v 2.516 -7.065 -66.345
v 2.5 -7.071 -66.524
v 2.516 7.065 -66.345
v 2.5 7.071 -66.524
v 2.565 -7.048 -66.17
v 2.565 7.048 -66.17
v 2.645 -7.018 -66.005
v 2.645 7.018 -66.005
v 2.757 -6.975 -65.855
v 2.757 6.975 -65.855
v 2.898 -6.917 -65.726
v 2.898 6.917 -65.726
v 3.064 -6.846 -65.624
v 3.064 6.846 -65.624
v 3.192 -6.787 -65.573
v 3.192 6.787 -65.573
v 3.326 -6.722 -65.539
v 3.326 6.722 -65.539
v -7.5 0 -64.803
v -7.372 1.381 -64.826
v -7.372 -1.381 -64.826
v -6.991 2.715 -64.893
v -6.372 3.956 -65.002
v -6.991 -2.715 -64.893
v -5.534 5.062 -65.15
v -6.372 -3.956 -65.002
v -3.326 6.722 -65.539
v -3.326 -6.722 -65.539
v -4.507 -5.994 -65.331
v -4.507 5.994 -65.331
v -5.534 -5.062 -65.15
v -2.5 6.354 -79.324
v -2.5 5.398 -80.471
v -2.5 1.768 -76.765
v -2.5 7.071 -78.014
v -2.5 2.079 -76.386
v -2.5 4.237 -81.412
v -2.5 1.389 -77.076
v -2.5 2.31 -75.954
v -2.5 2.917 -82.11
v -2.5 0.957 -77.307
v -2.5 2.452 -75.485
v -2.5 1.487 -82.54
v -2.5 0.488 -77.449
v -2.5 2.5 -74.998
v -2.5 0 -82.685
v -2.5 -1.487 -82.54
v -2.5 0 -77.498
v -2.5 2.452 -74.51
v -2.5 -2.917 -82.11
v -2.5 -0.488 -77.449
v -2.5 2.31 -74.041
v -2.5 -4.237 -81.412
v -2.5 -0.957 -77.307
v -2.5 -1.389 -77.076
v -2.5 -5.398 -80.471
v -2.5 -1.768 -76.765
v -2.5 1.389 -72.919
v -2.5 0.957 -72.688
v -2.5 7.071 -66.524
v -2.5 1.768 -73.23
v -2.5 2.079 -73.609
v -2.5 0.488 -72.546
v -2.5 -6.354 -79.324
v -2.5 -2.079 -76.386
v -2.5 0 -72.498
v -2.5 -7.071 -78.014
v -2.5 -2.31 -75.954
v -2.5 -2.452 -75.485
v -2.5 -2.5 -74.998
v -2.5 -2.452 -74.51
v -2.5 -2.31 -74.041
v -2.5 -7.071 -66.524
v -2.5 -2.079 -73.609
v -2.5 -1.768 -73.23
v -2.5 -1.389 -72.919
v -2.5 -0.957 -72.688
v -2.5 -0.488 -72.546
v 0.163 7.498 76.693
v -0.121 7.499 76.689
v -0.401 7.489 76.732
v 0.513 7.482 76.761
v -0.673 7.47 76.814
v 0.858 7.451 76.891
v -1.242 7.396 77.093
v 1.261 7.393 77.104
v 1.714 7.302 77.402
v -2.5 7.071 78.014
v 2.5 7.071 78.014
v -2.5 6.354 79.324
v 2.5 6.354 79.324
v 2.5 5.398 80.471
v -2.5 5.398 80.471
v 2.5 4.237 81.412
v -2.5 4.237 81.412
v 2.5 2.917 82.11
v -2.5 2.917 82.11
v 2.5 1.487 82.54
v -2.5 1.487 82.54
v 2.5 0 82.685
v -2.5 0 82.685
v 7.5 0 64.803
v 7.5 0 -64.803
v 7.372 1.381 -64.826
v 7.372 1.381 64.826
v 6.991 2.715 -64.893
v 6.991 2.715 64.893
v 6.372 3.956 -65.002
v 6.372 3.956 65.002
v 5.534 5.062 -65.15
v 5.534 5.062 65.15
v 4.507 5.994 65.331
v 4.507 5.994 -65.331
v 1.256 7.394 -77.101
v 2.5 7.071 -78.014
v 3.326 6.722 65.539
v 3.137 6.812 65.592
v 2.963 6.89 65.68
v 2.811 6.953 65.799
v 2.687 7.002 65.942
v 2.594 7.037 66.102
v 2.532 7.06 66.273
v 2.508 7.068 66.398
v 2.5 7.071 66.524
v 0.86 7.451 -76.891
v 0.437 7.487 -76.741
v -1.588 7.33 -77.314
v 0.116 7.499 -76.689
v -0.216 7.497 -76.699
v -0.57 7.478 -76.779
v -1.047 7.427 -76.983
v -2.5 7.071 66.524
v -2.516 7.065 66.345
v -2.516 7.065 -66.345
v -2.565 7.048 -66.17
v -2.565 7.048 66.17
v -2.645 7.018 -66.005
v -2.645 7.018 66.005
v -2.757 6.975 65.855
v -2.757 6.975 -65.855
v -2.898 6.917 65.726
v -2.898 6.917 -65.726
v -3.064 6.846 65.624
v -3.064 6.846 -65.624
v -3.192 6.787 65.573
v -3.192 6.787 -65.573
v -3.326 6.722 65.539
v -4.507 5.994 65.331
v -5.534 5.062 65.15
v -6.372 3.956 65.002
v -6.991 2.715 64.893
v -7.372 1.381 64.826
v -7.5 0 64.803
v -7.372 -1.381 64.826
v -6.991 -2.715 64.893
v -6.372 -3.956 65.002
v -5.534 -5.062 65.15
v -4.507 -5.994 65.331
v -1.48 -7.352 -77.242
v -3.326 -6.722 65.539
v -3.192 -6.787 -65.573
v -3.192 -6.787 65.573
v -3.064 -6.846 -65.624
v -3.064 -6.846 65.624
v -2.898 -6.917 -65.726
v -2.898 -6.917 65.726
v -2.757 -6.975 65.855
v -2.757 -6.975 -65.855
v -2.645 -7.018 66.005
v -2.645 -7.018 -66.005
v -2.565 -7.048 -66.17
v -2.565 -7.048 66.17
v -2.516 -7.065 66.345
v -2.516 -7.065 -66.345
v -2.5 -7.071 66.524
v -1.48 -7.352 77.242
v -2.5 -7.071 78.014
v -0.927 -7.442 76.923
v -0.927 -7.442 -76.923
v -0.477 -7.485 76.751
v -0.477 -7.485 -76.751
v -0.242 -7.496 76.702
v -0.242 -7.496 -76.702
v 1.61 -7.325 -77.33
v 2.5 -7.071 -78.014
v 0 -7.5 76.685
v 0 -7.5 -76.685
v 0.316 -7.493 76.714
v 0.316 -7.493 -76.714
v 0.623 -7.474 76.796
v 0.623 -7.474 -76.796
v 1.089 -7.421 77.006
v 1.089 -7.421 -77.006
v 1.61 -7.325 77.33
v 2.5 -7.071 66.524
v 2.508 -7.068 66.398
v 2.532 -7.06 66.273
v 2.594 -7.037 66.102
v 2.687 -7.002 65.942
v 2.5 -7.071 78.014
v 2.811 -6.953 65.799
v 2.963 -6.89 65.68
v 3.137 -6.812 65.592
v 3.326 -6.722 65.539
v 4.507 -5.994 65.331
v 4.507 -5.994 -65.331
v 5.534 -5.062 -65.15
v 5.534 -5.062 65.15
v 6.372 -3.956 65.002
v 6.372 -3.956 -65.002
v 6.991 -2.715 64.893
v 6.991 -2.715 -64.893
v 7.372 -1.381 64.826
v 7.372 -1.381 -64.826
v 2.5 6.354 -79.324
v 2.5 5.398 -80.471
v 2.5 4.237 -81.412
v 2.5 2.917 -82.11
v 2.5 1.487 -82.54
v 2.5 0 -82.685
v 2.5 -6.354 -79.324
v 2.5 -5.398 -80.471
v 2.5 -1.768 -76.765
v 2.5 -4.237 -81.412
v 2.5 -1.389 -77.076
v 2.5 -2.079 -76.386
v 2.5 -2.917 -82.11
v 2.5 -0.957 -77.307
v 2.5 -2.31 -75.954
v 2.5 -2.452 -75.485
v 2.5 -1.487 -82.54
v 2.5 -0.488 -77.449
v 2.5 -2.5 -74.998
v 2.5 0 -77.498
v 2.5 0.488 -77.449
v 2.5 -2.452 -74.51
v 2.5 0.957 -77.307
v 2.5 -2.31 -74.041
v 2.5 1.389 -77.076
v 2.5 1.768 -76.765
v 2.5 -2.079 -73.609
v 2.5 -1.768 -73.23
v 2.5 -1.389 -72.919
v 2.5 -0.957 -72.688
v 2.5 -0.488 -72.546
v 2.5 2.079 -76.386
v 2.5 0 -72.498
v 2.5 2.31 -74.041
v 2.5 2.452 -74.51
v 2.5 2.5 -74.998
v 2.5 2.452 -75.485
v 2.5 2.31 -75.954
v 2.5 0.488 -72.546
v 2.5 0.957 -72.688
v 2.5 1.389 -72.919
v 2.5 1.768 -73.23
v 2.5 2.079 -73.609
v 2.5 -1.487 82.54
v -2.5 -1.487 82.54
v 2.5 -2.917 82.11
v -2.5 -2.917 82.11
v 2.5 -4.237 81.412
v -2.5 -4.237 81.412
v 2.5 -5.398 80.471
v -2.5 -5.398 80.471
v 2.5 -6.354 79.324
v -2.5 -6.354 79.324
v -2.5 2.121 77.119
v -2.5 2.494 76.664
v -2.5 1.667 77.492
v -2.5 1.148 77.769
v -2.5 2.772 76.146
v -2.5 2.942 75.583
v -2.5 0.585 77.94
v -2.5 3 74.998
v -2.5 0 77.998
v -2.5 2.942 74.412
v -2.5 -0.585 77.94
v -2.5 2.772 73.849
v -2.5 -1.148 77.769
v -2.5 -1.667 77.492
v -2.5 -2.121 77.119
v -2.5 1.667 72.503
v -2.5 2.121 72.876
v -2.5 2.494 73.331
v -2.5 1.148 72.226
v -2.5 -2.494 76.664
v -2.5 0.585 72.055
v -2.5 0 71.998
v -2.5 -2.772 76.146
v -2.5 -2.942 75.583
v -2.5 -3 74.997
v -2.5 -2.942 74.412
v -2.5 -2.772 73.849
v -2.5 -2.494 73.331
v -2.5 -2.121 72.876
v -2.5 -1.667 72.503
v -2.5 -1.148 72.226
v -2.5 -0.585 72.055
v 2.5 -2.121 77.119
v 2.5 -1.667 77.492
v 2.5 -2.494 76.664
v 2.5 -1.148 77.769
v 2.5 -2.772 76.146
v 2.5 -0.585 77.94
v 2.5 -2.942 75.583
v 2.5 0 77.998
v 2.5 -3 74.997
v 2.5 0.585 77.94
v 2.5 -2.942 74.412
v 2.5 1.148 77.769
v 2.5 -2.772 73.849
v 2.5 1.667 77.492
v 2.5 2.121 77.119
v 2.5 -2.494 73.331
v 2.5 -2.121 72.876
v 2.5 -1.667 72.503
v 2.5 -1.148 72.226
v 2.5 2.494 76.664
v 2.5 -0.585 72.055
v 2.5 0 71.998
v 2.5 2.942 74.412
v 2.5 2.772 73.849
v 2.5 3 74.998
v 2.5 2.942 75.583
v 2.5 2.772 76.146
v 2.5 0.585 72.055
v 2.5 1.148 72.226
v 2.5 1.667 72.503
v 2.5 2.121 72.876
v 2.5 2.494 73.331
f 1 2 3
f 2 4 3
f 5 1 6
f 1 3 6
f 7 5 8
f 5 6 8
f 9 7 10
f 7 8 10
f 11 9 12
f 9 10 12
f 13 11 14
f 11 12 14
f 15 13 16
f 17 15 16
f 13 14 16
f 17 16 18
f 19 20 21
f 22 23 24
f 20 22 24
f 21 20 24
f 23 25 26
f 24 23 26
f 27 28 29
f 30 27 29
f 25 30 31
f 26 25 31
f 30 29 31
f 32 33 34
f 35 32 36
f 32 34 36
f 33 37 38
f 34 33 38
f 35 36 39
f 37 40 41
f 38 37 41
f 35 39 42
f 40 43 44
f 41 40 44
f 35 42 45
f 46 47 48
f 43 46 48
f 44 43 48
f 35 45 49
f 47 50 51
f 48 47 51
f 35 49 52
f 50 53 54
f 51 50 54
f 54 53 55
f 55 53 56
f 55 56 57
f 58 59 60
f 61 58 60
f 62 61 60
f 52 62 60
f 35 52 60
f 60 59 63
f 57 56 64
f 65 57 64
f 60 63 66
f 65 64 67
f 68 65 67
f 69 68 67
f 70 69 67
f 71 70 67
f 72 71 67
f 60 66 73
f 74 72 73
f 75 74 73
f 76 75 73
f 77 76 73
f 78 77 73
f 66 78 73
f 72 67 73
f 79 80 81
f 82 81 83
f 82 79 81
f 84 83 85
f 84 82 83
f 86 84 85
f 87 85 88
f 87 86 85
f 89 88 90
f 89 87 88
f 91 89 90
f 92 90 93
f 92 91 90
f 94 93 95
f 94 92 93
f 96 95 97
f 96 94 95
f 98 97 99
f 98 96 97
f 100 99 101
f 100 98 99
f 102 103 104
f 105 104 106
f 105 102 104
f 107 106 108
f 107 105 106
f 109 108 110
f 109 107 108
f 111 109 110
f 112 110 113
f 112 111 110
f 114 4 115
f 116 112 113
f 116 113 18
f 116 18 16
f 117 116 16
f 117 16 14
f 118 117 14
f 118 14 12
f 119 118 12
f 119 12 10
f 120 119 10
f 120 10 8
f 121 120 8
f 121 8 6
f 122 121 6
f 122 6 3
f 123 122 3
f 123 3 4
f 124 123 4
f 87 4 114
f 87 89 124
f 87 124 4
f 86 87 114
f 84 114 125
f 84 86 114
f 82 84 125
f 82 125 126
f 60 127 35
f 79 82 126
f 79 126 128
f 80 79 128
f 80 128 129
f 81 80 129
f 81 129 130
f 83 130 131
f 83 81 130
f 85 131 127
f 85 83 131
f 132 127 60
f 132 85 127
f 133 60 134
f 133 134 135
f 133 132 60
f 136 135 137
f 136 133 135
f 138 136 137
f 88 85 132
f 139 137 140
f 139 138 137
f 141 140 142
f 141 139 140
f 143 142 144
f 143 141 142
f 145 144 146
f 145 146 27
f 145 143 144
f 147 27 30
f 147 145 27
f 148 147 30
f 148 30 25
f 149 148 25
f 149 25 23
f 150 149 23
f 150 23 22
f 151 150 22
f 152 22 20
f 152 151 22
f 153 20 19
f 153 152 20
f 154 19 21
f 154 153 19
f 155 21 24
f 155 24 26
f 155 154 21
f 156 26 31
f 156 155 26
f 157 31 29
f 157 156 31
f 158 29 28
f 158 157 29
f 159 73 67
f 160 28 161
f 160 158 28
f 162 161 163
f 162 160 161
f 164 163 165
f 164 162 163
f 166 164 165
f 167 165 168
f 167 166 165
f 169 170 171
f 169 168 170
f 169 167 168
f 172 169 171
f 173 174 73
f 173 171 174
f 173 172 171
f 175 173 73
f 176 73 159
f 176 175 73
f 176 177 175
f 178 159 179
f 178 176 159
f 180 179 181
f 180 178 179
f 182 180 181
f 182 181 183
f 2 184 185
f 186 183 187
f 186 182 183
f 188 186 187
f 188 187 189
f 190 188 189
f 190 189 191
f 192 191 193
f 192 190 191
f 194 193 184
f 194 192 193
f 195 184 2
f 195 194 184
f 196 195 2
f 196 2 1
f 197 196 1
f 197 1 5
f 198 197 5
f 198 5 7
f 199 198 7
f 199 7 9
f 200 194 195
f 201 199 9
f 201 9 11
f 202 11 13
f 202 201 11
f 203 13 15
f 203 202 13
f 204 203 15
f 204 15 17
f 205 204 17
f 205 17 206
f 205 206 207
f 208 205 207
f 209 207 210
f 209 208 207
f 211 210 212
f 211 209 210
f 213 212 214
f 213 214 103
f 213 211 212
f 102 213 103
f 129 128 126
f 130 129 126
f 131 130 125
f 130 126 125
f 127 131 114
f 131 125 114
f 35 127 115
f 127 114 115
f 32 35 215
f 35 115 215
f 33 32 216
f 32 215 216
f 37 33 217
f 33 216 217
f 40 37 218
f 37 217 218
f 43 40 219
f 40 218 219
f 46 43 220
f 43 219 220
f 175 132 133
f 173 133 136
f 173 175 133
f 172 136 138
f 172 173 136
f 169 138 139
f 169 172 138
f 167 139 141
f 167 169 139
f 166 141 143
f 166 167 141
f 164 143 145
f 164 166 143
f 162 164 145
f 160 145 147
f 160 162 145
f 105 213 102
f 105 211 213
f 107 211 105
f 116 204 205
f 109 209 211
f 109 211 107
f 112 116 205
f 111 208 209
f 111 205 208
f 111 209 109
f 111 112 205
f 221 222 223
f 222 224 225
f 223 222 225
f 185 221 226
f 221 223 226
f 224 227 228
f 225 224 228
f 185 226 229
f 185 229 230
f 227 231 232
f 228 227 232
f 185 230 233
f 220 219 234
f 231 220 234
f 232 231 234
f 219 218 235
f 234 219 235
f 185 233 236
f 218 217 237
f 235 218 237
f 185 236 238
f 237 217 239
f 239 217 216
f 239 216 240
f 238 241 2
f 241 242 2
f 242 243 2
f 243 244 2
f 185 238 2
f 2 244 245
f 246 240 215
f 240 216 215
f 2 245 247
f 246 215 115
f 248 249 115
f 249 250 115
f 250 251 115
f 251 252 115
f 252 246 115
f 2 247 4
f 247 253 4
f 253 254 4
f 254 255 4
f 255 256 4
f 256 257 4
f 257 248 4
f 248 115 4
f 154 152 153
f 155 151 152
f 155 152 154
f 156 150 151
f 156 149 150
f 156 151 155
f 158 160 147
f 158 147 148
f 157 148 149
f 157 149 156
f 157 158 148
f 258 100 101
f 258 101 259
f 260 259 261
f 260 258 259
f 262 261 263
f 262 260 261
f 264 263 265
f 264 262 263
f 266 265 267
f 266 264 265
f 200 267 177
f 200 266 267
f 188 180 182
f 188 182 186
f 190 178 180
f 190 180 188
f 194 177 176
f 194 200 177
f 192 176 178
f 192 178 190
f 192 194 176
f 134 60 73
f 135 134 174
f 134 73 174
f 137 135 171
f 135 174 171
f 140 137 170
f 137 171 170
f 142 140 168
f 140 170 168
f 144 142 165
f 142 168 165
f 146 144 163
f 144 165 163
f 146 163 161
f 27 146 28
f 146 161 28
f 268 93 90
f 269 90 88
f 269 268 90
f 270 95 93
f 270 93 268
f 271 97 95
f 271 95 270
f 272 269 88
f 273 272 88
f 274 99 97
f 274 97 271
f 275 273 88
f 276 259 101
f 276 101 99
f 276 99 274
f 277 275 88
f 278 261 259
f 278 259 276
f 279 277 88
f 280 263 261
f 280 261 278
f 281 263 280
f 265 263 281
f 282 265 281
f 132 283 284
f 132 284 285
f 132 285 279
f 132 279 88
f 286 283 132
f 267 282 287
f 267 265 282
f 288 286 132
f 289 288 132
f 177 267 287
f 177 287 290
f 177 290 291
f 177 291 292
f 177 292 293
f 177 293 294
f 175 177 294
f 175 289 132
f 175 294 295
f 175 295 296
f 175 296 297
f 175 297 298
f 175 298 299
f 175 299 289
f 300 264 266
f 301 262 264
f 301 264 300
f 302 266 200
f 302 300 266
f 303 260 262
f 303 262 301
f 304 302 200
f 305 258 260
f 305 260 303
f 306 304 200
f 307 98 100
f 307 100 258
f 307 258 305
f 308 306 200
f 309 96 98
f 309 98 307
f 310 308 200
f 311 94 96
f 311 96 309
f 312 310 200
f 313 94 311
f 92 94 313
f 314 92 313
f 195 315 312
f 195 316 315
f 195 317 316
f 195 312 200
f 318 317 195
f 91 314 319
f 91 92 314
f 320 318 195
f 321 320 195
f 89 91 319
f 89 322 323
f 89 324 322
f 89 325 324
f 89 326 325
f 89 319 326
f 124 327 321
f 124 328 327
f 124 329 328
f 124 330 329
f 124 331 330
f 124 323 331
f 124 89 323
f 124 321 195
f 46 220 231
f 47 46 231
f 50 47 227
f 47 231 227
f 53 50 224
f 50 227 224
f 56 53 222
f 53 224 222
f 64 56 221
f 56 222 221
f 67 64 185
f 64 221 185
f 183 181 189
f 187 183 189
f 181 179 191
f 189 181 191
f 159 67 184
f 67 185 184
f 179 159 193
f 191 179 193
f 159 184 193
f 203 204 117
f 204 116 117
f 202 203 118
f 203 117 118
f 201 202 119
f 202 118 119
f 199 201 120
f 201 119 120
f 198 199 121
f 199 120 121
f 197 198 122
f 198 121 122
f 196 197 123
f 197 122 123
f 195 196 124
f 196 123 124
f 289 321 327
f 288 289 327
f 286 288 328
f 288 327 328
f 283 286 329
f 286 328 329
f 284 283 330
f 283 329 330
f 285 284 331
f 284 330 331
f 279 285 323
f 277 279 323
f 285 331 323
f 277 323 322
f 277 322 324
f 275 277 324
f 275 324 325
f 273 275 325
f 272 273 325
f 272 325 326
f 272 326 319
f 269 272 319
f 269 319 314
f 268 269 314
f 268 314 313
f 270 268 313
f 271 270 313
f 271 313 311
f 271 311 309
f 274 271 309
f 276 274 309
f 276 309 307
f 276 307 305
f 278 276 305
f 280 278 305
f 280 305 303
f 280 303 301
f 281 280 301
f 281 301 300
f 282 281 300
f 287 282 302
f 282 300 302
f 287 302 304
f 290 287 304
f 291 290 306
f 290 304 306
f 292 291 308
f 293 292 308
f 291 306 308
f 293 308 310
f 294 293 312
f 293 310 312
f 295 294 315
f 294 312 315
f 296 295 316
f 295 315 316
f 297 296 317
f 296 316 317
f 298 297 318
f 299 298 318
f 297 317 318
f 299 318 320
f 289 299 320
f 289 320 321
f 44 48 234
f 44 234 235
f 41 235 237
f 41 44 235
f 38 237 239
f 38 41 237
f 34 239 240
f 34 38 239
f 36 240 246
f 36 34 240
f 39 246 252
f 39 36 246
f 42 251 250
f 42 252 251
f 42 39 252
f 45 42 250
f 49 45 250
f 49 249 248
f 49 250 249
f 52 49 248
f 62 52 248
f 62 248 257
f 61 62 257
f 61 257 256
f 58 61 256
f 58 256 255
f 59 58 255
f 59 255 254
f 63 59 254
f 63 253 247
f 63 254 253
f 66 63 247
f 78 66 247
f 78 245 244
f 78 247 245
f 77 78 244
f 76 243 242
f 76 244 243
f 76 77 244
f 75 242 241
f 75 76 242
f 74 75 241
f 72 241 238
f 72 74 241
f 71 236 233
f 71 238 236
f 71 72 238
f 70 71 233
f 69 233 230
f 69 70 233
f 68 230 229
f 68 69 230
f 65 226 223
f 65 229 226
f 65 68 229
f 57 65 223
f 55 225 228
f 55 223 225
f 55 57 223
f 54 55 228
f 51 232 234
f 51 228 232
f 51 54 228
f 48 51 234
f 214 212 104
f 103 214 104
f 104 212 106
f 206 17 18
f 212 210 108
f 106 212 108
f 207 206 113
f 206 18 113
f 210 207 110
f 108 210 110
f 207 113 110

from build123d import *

# Parameters (mm, degrees)
SKETCH1_R               = 7.5
BOSS_EXTRUDE1_DEPTH     = 82.685
CUT_EXTRUDE2_DEPTH      = 84.362516907
CUT_EXTRUDE3_DEPTH      = 84.362517024
CUT_EXTRUDE4_DEPTH      = 84.624513422
CUT_EXTRUDE4_DEPTH_BACK = 84.624513422
SKETCH8_R               = 2.5
FILLET1_R               = 1
FILLET1_OF_MIRROR2_R    = 1
SKETCH9_R               = 3
CUT_EXTRUDE5_DEPTH      = 10


with BuildPart() as part:
    # Sketch1 → Boss-Extrude1 (new, symmetric)
    with BuildSketch(Plane.XY):
        Circle(SKETCH1_R)
    extrude(amount=BOSS_EXTRUDE1_DEPTH, both=True)

    # Sketch6 → Cut-Extrude2 (cut, symmetric)
    with BuildSketch(Plane(origin=(0, 0, 0), x_dir=(0, 0, -1), z_dir=(1, 0, 0))):
        with BuildLine():
            Line((82.685, 0), (82.685, 7.5))
            Line((82.685, 7.5), (76.685, 7.5))
            ThreePointArc((76.685, 7.5), (81.000428973, 4.802343178), (82.685, 0))
        make_face()
        with BuildLine():
            Line((82.685, -7.5), (82.685, 0))
            ThreePointArc((82.685, 0), (81.000428973, -4.802343178), (76.685, -7.5))
            Line((76.685, -7.5), (82.685, -7.5))
        make_face()
    cut_extrude2 = extrude(amount=CUT_EXTRUDE2_DEPTH, both=True, mode=Mode.SUBTRACT)

    # Sketch7 → Cut-Extrude3 (cut, symmetric)
    with BuildSketch(Plane(origin=(0, 0, 0), x_dir=(1, 0, 0), z_dir=(0, 1, 0))):
        Polygon((-2.5, 82.685), (-2.5, 65.685), (-7.5, 64.803365096), (-7.5, 82.685), align=None)
        Polygon((7.5, 82.685), (2.5, 82.685), (2.5, 65.685), (7.5, 64.803365096), align=None)
    cut_extrude3 = extrude(amount=CUT_EXTRUDE3_DEPTH, both=True, mode=Mode.SUBTRACT)

    # Sketch8 → Cut-Extrude4 (cut, two sides: drawn at the far end of the back side and taken through both)
    with BuildSketch(Plane(origin=(-2.5, 0, 0), x_dir=(0, 0, -1), z_dir=(1, 0, 0)).offset(-CUT_EXTRUDE4_DEPTH_BACK)):
        with Locations((74.9975, 0)):
            Circle(SKETCH8_R)
    extrude(amount=CUT_EXTRUDE4_DEPTH + CUT_EXTRUDE4_DEPTH_BACK, mode=Mode.SUBTRACT)

    # Fillet1
    fillet1_edges = [part.edges().sort_by_distance(p)[0] for p in [
        (-2.5, 0, -65.685),
        (2.5, 0, -65.685),
    ]]
    fillet(fillet1_edges, radius=FILLET1_R)

    # Mirror2: Cut-Extrude2, Cut-Extrude3 across plane
    add(cut_extrude2.mirror(Plane.XY), mode=Mode.SUBTRACT)
    add(cut_extrude3.mirror(Plane.XY), mode=Mode.SUBTRACT)

    # Fillet1 of Mirror2
    fillet1_of_mirror2_edges = [part.edges().sort_by_distance(p)[0] for p in [
        (-2.5, 0, 65.685),
        (2.5, 0, 65.685),
    ]]
    fillet(fillet1_of_mirror2_edges, radius=FILLET1_OF_MIRROR2_R)

    # Sketch9 → Cut-Extrude5 (cut)
    with BuildSketch(Plane(origin=(2.5, 0, 0), x_dir=(0, 0, -1), z_dir=(1, 0, 0))):
        with Locations((-74.9975, 0)):
            Circle(SKETCH9_R)
    extrude(amount=-CUT_EXTRUDE5_DEPTH, mode=Mode.SUBTRACT)


solid = part.part
